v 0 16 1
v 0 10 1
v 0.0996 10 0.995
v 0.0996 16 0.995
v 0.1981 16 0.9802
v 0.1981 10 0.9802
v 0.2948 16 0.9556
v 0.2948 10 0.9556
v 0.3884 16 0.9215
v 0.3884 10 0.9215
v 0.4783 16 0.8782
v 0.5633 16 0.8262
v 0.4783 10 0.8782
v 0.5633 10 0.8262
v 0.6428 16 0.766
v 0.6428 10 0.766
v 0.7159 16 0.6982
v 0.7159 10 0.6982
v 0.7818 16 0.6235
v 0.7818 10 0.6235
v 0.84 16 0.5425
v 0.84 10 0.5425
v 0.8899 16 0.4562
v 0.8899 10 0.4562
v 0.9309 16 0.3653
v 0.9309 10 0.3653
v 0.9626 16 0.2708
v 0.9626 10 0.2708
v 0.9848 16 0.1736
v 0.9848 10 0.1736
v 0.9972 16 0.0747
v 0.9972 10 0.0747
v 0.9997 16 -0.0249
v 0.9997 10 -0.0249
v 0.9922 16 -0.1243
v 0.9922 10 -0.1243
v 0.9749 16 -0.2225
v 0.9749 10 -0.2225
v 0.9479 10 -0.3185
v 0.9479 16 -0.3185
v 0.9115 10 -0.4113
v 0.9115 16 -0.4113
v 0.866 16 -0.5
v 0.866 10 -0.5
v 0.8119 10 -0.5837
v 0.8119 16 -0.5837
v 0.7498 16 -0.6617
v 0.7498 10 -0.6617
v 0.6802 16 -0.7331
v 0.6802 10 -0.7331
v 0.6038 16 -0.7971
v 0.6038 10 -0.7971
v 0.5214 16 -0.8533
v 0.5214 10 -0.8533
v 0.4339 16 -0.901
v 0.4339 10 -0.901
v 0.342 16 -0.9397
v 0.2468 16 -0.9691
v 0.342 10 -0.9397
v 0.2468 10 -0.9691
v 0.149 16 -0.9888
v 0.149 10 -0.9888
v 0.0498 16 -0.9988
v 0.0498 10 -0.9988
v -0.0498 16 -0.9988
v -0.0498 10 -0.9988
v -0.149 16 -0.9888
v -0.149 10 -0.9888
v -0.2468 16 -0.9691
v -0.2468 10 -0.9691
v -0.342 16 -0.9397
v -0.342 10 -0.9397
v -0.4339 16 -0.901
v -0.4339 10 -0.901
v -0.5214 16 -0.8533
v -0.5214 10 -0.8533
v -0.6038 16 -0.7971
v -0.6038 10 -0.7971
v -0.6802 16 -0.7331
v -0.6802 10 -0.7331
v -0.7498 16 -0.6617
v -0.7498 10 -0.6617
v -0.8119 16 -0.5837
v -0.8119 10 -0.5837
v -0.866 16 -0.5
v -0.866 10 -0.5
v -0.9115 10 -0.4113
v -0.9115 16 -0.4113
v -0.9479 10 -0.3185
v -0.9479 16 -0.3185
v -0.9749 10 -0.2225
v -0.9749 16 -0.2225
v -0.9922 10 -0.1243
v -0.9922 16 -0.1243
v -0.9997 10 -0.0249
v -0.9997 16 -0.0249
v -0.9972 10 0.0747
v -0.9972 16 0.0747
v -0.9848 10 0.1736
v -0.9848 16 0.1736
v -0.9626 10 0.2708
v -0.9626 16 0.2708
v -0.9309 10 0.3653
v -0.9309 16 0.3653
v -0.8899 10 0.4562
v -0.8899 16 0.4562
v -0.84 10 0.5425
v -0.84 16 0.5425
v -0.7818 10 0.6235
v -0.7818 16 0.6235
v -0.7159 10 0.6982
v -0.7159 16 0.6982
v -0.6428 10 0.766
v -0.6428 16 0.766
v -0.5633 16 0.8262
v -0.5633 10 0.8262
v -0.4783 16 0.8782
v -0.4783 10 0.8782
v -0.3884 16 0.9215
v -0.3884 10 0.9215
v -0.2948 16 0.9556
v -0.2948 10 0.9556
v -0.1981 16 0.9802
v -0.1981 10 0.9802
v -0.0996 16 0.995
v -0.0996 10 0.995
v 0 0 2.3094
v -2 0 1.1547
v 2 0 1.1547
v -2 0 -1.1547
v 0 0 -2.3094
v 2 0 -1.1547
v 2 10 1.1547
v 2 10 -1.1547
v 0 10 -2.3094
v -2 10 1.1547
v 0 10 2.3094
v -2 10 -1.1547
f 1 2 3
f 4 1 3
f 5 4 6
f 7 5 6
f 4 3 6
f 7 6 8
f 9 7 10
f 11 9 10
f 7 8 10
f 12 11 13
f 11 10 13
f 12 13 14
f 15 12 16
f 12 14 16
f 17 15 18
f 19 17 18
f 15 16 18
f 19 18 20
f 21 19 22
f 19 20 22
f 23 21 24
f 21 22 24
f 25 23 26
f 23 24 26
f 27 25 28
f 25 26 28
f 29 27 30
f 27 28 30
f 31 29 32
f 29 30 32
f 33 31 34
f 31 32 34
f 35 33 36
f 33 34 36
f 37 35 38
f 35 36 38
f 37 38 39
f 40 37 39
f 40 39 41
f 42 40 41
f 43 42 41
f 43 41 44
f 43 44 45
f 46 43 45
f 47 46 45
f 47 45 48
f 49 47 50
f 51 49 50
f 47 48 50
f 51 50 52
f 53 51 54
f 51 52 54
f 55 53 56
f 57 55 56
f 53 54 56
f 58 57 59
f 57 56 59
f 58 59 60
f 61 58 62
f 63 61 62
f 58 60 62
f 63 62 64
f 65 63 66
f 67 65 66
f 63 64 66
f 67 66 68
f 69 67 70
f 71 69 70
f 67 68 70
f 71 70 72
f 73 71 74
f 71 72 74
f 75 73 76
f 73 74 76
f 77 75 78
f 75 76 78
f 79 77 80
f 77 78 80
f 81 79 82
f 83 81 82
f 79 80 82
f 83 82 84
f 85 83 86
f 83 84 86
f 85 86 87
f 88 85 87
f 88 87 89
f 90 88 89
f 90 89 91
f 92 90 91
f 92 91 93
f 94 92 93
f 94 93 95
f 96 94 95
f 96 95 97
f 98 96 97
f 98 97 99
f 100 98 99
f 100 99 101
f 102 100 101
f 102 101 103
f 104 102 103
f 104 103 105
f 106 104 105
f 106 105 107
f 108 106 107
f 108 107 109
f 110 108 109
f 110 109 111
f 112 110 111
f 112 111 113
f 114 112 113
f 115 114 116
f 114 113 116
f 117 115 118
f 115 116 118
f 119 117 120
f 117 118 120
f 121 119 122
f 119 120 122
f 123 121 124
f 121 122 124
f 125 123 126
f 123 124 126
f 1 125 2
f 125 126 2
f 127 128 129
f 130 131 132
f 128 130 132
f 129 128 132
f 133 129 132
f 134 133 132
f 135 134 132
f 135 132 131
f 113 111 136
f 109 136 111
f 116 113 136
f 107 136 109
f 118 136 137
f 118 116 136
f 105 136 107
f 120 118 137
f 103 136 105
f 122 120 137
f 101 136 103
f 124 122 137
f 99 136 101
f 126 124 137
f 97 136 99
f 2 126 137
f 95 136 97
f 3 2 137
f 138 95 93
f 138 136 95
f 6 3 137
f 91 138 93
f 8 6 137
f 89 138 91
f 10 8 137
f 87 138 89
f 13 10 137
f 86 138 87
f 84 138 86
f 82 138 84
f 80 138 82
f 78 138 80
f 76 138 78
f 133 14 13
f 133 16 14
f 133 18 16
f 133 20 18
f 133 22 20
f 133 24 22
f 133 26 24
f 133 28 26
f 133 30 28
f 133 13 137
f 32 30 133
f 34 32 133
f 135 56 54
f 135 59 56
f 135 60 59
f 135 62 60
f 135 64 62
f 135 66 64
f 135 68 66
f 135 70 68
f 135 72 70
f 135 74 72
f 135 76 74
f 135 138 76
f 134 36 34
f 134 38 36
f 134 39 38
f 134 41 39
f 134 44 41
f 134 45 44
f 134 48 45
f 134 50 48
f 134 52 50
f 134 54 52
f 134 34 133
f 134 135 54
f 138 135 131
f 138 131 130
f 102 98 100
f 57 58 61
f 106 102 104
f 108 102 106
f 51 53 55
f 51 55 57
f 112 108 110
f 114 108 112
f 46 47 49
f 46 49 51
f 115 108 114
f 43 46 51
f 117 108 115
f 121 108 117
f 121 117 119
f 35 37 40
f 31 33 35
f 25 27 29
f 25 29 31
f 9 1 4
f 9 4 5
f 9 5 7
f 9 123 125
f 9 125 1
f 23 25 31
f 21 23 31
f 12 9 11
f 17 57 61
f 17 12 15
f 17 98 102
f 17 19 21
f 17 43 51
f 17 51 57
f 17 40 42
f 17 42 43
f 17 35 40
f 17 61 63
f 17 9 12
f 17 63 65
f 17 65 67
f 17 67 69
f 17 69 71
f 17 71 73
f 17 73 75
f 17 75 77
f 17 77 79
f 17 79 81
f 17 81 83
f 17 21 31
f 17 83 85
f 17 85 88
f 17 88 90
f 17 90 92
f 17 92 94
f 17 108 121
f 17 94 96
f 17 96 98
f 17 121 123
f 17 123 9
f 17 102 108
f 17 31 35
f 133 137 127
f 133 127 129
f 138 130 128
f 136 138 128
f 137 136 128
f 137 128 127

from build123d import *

# Parameters (mm, degrees)
EXTRUDE_1_DEPTH = 10
SKETCH_2_R      = 1
EXTRUDE_2_DEPTH = 6


with BuildPart() as part:
    # Эскиз1 → Бобышка-Вытянуть1 (new body)
    with BuildSketch(Plane(origin=(0, 0, 0), x_dir=(1, 0, 0), z_dir=(0, 1, 0))):
        Polygon((0, -2.309401077), (2, -1.154700538), (2, 1.154700538), (0, 2.309401077), (-2, 1.154700538), (-2, -1.154700538), align=None)
    extrude(amount=EXTRUDE_1_DEPTH)

    # Эскиз2 → Бобышка-Вытянуть2 (add)
    with BuildSketch(Plane(origin=(0, 10, 0), x_dir=(1, 0, 0), z_dir=(0, 1, 0))):
        with Locations(Location((0, 0, 0), (0, 0, 270))):
            Circle(SKETCH_2_R)
    extrude(amount=EXTRUDE_2_DEPTH)


solid = part.part
